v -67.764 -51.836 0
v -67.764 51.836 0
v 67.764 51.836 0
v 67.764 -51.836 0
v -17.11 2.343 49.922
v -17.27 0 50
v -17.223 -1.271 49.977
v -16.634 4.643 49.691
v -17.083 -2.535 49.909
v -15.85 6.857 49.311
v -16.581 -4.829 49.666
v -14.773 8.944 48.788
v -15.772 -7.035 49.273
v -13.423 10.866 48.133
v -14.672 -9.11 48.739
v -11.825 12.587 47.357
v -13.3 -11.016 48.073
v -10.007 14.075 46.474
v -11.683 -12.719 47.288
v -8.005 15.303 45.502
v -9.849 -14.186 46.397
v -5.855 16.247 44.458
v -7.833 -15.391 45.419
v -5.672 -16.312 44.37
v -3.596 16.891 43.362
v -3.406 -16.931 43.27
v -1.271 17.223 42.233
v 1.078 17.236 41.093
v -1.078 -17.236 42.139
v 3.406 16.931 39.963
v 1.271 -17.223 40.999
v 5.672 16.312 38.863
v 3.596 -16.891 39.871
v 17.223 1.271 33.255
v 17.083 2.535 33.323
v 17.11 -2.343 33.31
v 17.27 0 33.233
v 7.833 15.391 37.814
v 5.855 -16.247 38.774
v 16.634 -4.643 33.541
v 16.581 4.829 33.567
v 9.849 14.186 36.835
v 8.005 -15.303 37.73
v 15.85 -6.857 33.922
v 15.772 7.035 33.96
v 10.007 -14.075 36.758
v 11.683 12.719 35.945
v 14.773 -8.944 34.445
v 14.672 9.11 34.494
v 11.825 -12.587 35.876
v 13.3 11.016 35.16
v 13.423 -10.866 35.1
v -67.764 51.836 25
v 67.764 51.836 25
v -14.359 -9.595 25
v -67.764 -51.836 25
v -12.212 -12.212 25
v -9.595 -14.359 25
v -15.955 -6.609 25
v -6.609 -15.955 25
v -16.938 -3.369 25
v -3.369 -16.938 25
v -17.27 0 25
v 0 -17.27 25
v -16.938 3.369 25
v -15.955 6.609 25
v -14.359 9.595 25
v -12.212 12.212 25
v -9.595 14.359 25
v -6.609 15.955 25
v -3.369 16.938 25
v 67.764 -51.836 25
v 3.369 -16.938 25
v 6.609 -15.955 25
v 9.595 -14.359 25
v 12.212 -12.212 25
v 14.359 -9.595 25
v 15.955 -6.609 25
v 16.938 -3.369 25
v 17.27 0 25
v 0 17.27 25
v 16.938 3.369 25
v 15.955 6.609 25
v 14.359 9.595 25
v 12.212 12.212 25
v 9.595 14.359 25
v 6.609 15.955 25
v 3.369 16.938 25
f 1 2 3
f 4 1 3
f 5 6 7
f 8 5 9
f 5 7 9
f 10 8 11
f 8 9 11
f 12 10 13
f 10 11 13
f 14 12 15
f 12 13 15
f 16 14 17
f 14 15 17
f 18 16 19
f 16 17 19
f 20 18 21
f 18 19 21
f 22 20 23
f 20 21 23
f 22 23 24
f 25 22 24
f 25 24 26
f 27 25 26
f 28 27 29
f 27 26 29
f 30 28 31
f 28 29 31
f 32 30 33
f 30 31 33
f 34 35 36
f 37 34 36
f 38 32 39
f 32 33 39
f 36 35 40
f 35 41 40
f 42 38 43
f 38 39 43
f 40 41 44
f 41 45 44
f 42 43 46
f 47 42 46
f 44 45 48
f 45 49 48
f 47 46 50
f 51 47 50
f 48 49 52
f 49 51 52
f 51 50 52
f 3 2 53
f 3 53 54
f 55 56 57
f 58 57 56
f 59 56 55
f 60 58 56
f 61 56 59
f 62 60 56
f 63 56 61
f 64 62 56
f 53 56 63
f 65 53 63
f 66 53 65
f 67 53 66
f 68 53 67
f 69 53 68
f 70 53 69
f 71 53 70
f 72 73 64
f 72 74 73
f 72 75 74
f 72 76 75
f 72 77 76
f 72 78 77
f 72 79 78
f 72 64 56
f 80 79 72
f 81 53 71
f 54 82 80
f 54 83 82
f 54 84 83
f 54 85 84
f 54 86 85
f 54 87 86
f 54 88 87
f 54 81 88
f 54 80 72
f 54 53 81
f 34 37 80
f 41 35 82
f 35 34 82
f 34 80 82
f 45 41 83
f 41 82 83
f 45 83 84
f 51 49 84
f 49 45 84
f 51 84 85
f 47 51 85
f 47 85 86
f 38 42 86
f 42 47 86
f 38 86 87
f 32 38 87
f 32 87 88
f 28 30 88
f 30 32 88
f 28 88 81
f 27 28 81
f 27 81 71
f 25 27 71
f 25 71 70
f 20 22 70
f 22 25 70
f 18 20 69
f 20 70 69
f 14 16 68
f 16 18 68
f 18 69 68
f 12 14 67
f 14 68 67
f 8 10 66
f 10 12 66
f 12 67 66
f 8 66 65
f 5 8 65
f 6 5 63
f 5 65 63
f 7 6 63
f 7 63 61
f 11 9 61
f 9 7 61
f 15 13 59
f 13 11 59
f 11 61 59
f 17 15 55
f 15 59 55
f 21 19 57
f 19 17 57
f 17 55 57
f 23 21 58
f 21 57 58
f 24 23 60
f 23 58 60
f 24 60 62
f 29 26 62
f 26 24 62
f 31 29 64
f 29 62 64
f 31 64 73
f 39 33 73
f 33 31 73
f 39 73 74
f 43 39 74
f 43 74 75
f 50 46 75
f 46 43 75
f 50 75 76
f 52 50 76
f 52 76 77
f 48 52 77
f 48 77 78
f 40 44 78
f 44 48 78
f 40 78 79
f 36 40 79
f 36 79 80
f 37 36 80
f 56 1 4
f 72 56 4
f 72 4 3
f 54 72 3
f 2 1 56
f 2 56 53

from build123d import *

# Parameters (mm, degrees)
F0_W     = 135.5276703835
F0_H     = 103.6717817187
F1_DEPTH = 25
F2_R     = 17.2700021185
F3_DEPTH = 25
F5_DEPTH = 103.6727817187


# Not quite as in the source:
# - a feature names something its author has since deleted; it is built from what else it names


with BuildPart() as f1:
    # F0 (on Top) → F1 (new body)
    with BuildSketch(Plane.XY):
        Rectangle(F0_W, F0_H)
    extrude(amount=F1_DEPTH)

    # F2 (on face) → F3 (join)
    with BuildSketch(Plane.XY.offset(25)):
        Circle(F2_R)
    extrude(amount=F3_DEPTH)

    # F4 (on face) → F5 (cut, through all)
    with BuildSketch(Plane.XZ.offset(51.8358908594)):
        Polygon((23.7591248006, 58.1170134246), (-17.2700021185, 50), (17.2700021185, 33.2325548289), (23.7591248006, 30.0824102014), align=None)
    extrude(amount=-F5_DEPTH, mode=Mode.SUBTRACT)


solid = f1.part
